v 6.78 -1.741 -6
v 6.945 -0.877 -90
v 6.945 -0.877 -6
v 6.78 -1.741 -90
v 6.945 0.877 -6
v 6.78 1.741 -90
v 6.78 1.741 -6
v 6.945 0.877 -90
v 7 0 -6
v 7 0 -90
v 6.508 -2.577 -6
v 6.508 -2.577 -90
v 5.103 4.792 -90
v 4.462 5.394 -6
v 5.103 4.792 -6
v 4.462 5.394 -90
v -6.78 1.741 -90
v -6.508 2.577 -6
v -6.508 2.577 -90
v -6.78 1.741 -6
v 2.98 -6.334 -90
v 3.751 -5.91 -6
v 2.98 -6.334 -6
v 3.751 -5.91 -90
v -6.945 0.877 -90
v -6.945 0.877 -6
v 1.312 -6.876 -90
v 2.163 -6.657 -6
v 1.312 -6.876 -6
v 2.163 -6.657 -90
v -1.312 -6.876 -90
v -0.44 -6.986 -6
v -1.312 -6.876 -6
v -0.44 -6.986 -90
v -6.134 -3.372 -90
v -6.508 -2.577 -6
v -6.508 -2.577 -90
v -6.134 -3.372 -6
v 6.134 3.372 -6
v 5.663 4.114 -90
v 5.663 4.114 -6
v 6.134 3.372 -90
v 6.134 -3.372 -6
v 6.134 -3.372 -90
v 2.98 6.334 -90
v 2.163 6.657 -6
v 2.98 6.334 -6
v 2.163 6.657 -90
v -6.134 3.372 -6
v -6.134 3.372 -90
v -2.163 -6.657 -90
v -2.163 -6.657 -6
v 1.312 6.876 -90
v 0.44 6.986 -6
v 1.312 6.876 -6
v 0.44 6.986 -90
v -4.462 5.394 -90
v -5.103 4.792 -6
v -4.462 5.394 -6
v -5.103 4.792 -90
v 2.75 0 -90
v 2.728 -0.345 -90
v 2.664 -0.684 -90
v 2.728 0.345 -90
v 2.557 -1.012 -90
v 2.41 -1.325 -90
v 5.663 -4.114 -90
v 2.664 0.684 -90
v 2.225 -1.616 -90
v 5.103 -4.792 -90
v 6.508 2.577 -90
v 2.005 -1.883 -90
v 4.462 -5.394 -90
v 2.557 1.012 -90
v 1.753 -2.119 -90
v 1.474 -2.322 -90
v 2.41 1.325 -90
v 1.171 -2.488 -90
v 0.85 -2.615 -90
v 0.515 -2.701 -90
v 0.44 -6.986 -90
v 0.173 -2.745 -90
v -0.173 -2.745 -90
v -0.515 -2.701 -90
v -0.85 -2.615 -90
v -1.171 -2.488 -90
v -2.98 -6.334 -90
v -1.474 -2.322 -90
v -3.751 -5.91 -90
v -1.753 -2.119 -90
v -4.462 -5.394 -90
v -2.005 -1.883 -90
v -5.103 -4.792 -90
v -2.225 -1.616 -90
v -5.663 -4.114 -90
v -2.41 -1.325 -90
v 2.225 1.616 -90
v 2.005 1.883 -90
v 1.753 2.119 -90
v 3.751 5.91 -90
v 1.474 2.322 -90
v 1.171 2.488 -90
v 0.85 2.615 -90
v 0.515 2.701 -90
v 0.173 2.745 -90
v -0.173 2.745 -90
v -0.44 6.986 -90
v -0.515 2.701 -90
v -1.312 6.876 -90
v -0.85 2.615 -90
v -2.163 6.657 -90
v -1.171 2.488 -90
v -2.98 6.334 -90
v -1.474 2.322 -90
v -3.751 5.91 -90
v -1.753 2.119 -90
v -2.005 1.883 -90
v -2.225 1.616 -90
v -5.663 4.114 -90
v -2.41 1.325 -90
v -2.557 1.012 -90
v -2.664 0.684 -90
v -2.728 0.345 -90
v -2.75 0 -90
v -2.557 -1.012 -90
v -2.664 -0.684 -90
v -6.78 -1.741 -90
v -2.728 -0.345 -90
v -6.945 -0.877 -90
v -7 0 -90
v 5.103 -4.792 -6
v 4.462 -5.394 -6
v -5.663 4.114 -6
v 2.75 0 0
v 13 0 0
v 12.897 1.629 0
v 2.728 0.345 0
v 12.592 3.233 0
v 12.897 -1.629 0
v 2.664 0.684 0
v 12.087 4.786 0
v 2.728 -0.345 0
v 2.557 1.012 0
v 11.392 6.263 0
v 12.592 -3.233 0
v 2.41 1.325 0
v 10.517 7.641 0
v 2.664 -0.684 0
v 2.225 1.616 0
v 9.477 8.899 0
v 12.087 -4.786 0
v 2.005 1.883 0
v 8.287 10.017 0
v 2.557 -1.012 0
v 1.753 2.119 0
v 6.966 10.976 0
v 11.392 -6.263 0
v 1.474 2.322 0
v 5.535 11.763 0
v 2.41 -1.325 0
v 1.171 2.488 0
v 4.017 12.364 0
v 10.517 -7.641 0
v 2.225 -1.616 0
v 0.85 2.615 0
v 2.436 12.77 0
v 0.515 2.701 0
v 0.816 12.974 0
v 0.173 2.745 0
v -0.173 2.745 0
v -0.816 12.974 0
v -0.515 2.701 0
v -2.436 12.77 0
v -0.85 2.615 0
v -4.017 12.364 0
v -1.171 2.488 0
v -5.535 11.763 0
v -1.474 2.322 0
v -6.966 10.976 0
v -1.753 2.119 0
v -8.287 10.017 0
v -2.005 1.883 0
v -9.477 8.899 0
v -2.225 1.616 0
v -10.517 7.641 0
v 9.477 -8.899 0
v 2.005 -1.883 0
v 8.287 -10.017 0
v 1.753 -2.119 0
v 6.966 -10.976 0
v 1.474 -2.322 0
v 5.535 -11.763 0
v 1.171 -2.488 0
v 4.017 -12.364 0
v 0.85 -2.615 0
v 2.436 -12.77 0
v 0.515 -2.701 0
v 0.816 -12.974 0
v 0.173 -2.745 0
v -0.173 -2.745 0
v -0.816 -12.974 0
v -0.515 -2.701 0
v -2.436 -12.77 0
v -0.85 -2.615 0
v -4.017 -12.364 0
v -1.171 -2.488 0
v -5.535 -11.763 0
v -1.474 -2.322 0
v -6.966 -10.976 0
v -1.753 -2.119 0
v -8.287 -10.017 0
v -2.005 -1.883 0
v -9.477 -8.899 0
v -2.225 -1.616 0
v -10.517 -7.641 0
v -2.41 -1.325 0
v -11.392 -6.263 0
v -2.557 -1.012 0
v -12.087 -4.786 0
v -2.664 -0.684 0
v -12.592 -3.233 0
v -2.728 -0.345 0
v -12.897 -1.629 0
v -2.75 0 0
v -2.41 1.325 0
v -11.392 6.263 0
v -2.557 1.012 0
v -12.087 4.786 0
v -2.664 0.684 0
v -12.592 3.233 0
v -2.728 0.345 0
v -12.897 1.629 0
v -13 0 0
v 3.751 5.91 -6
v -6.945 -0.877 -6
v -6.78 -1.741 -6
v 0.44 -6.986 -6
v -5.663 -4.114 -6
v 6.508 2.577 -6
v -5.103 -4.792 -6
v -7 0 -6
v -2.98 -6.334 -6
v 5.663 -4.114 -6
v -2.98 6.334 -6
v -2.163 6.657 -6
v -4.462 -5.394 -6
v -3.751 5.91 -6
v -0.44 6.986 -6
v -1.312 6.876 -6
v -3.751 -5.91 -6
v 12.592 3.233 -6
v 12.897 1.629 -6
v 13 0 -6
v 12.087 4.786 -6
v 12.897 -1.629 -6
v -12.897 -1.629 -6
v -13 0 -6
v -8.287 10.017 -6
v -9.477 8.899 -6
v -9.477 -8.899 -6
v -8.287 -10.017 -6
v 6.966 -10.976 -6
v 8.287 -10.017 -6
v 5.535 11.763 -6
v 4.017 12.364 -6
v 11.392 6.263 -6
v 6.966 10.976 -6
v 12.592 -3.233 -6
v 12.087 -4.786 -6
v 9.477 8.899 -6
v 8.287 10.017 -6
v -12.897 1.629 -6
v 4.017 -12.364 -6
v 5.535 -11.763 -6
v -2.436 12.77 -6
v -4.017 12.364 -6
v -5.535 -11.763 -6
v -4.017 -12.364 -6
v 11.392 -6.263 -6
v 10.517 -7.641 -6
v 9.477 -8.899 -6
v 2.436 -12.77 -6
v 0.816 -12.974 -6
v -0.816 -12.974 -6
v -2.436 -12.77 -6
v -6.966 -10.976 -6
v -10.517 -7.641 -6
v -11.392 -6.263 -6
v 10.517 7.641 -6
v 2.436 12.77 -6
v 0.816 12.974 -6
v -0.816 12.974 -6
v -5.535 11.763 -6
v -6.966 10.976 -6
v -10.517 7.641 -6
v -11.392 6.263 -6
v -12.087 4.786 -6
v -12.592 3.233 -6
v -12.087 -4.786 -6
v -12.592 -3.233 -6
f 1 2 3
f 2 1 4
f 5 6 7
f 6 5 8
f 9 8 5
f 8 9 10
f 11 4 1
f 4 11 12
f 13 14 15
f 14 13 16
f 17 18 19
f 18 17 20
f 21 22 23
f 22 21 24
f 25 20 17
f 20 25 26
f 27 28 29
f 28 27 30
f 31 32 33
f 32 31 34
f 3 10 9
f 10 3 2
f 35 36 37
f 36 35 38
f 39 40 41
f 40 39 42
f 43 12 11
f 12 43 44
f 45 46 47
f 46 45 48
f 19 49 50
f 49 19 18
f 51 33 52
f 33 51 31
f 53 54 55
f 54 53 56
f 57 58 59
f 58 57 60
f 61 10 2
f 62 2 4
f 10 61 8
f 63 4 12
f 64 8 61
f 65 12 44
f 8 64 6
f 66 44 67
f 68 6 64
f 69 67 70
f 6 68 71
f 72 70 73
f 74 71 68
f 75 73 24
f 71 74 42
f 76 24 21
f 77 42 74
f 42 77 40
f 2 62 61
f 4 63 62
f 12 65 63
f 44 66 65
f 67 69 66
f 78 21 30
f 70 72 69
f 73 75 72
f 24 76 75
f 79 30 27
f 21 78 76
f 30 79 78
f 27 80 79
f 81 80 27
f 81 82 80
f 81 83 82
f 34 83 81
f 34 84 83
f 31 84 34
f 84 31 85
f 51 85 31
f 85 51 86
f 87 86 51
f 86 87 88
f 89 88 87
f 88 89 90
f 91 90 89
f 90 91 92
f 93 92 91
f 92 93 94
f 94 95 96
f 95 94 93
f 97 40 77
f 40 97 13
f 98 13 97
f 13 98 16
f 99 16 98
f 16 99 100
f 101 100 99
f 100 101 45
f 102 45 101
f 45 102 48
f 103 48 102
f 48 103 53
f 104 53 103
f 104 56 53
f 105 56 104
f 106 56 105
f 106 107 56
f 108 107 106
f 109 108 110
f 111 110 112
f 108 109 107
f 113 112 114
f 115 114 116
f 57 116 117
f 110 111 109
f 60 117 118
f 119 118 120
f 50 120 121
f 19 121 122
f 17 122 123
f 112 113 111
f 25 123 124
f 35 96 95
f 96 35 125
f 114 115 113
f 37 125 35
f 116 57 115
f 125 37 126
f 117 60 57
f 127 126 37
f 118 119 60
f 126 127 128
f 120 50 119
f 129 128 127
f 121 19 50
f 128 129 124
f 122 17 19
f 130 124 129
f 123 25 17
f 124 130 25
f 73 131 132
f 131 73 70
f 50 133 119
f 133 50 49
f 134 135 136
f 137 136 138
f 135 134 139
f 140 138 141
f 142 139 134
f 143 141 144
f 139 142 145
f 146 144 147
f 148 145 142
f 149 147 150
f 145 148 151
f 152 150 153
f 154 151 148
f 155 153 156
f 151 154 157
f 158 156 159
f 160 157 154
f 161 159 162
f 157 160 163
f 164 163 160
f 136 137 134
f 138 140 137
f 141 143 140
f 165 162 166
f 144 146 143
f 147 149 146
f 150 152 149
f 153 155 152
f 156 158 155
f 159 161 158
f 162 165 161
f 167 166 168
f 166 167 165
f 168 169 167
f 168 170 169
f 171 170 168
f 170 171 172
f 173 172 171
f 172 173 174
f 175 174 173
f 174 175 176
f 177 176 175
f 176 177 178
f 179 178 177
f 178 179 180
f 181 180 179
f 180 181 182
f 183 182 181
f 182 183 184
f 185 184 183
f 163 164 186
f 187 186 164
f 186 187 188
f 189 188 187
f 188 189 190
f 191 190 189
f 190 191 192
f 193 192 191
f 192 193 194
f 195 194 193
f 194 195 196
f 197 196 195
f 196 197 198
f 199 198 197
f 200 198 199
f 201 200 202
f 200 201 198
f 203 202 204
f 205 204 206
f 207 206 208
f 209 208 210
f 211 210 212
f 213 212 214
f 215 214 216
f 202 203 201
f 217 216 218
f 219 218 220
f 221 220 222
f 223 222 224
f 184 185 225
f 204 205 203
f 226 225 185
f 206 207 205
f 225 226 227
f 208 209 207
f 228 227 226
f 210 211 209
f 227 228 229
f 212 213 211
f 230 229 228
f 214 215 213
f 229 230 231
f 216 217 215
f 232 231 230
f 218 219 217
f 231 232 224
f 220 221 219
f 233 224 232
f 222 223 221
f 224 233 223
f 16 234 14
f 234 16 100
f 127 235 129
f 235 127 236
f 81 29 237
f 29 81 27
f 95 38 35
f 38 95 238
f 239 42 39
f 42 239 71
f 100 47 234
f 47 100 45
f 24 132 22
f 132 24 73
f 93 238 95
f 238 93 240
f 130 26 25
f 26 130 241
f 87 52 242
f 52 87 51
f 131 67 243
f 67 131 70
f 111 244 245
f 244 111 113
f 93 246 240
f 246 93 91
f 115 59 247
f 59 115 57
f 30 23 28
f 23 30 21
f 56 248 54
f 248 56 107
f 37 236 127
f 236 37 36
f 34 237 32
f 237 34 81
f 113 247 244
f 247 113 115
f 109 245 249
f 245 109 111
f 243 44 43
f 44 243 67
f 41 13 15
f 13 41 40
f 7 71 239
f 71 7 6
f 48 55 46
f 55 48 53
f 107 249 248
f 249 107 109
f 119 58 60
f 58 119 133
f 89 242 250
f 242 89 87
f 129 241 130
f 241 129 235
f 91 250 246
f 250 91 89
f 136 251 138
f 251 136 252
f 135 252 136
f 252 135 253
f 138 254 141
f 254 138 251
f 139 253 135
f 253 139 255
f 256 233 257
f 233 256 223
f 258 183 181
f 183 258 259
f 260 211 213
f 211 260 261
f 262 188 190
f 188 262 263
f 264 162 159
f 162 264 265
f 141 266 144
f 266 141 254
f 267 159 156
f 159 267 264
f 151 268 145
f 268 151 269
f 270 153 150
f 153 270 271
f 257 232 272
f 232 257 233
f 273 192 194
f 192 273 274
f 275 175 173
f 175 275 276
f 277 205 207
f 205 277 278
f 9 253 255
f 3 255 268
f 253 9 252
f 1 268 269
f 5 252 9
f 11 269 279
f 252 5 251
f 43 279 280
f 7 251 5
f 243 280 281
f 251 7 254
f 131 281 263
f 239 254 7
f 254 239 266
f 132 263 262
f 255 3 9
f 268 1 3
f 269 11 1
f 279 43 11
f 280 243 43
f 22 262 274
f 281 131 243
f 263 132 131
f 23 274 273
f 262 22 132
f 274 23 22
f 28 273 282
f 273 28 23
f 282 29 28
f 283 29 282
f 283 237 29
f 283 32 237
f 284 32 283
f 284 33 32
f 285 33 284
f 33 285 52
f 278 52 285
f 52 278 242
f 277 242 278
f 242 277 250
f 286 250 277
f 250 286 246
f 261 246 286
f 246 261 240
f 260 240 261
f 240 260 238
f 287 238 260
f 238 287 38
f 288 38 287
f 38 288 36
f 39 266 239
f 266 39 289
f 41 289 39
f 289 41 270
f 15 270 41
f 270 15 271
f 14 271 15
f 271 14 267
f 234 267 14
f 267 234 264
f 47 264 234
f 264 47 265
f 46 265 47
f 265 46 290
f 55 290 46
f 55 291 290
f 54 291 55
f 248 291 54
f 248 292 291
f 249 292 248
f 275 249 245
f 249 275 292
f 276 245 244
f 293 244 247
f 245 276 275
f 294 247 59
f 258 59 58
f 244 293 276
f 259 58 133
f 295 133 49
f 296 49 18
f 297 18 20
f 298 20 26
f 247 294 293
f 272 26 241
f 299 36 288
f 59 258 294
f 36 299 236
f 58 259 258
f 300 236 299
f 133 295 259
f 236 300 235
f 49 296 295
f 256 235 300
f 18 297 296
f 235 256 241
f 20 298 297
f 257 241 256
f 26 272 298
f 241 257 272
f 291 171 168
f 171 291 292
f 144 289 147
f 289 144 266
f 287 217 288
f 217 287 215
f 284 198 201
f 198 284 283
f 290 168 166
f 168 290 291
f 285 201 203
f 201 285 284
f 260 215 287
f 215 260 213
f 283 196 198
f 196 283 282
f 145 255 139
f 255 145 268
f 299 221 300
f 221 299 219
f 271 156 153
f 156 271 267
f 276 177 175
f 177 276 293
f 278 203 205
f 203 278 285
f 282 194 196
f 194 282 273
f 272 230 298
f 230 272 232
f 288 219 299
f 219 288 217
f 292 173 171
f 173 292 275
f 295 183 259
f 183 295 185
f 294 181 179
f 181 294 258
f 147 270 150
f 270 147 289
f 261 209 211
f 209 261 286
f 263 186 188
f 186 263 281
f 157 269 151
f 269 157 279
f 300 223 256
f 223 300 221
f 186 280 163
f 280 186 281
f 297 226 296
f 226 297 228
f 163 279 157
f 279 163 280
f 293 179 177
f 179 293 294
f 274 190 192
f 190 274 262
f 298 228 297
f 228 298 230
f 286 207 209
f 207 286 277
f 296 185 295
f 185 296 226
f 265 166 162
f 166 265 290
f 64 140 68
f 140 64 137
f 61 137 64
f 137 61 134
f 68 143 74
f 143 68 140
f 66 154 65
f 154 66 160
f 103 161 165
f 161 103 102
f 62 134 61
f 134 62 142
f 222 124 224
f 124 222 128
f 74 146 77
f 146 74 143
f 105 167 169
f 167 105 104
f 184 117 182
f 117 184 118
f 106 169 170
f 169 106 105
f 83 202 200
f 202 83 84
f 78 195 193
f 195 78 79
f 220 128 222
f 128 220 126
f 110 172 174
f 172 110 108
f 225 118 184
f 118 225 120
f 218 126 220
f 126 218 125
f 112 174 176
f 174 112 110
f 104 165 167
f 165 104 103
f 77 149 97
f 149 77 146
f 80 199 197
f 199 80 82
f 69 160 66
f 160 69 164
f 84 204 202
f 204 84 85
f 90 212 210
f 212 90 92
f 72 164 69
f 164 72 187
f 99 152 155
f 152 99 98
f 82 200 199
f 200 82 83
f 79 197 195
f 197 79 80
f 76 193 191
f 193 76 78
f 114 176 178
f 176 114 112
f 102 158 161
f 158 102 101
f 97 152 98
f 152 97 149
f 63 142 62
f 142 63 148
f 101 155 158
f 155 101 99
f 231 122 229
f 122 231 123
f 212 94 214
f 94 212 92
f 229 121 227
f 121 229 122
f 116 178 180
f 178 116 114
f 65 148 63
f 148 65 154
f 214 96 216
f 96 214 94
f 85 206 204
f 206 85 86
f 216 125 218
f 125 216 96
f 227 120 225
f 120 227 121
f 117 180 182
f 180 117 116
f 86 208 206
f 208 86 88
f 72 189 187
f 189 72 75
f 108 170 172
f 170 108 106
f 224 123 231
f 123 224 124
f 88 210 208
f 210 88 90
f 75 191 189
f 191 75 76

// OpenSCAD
$fn = 50;


difference() {
	union() {
		translate(v = [0, 0, -90.0000000000]) {
			cylinder(h = 90, r = 7.0000000000);
		}
		translate(v = [0, 0, -6.0000000000]) {
			cylinder(h = 6, r = 13.0000000000);
		}
	}
	union() {
		#translate(v = [0, 0, -90]) {
			cylinder(h = 90, r = 2.7500000000);
		}
	}
}
